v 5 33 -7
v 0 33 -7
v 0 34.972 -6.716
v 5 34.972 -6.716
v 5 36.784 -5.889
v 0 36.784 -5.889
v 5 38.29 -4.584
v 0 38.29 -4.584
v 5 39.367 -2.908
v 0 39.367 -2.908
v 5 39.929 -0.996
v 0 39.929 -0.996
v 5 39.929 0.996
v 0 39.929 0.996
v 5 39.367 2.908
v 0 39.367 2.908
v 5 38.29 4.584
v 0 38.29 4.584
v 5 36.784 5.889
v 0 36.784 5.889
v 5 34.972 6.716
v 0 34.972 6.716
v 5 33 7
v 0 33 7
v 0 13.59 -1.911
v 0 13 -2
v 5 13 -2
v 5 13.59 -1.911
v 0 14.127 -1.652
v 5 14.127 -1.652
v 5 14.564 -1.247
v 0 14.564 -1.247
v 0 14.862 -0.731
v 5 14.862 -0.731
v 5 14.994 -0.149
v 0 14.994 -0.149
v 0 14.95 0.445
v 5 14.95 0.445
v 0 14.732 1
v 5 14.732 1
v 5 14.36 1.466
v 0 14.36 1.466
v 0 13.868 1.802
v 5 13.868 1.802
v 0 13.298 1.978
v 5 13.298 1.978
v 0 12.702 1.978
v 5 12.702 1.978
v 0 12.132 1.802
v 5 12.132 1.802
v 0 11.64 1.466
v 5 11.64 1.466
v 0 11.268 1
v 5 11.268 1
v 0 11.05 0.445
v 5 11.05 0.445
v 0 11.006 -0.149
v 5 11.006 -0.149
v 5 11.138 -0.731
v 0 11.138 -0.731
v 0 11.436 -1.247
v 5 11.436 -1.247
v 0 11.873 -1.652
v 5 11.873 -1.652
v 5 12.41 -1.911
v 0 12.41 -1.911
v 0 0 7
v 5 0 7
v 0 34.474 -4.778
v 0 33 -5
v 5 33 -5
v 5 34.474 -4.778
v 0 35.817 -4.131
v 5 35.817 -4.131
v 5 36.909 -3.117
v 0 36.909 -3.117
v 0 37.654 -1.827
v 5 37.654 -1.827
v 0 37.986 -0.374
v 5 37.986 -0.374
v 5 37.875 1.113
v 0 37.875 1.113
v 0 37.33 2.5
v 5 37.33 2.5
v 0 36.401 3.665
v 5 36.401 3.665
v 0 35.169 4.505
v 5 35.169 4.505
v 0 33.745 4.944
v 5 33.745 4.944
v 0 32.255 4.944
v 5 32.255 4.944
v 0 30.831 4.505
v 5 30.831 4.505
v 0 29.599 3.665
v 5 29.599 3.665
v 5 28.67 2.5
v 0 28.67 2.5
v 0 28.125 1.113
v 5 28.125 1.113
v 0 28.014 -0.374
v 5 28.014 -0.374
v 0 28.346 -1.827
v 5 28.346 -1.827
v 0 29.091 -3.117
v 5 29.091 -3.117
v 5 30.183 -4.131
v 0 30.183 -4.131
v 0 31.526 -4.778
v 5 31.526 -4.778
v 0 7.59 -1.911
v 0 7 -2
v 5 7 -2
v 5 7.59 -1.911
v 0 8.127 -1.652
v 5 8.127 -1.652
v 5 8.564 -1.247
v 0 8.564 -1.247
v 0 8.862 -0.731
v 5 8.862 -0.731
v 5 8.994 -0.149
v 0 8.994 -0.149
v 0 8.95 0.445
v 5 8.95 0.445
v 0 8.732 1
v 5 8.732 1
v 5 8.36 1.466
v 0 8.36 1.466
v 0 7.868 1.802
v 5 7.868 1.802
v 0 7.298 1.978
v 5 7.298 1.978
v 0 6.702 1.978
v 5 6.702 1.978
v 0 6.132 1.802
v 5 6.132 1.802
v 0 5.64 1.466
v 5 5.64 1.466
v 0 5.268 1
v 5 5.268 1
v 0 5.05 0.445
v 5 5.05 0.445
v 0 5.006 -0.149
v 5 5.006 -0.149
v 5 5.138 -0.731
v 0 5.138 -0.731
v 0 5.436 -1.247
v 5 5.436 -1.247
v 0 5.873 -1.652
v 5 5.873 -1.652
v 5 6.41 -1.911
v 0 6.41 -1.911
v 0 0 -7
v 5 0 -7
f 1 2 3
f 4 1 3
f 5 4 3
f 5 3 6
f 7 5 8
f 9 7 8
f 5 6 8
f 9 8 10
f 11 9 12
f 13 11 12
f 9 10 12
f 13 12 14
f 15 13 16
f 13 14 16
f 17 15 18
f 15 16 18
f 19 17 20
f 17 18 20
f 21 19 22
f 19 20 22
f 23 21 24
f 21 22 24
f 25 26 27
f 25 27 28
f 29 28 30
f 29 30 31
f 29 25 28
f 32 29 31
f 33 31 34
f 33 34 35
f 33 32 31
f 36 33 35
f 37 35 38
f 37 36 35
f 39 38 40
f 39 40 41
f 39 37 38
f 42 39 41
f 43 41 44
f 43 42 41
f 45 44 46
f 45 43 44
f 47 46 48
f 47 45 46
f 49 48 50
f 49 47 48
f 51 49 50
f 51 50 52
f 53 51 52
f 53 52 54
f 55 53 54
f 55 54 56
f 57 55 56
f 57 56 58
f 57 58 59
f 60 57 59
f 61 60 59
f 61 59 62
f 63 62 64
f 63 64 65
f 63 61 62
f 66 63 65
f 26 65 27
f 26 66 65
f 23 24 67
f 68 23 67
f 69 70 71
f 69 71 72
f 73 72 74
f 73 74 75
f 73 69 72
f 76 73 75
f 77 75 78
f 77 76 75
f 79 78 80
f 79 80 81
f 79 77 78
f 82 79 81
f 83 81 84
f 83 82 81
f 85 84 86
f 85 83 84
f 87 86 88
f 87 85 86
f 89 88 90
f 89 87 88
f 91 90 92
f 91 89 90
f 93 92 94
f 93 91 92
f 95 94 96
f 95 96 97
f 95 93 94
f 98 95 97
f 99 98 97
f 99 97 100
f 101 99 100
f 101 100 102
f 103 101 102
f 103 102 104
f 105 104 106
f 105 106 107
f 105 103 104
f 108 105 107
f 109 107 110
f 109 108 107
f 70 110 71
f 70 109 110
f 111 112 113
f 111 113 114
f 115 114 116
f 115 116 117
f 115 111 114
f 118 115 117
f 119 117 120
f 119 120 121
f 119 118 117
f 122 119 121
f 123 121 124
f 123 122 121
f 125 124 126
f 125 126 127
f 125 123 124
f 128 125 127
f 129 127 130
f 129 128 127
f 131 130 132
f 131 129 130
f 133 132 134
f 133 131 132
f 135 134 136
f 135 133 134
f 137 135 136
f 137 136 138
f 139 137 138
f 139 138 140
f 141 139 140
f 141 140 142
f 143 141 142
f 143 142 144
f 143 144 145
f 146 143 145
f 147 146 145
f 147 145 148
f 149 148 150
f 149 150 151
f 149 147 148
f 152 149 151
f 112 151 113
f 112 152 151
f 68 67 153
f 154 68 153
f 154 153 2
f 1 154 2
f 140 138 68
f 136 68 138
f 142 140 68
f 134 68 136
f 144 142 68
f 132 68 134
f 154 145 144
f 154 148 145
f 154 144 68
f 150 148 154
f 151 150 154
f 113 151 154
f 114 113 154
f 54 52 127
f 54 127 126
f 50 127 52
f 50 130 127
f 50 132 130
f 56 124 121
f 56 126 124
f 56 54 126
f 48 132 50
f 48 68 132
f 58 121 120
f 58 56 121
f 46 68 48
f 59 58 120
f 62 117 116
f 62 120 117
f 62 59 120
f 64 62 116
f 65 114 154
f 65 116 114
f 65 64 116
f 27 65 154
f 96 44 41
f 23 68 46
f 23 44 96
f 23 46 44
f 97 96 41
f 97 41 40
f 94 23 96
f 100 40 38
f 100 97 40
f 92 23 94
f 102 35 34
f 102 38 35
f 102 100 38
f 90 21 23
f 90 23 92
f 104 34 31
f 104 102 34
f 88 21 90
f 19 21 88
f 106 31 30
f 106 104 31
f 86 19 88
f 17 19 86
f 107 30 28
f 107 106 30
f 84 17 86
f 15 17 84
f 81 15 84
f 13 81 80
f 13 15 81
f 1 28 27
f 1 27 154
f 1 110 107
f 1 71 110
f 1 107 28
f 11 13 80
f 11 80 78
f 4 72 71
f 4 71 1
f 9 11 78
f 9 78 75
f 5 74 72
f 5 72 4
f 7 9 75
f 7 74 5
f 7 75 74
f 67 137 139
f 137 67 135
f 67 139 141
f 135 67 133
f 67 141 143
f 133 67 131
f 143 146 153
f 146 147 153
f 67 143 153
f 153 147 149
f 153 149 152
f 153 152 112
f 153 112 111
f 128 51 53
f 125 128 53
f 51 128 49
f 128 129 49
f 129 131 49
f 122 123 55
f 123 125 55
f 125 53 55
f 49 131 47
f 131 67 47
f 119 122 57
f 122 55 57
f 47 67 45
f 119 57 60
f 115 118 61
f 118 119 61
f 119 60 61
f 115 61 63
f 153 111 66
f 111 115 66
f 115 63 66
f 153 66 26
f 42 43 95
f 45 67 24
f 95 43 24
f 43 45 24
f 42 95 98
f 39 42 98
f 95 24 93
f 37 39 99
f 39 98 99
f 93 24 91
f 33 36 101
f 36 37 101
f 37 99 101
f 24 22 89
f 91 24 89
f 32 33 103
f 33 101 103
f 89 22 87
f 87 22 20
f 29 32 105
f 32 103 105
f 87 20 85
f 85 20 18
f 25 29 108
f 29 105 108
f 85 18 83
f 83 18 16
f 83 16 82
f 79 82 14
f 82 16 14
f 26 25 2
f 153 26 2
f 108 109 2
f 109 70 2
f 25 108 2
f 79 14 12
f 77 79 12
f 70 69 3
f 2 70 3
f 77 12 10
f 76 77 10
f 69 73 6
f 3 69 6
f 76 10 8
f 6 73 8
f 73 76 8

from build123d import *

# Parameters (mm, degrees)
SKETCH_1_R      = 5
SKETCH_1_R_2    = 2
EXTRUDE_1_DEPTH = 5


with BuildPart() as part:
    # 草图1 → 凸台-拉伸1 (new body)
    with BuildSketch(Plane(origin=(0, 0, 0), x_dir=(0, 0, -1), z_dir=(1, 0, 0))):
        with BuildLine():
            Line((-7, 33), (-7, 0))
            Line((-7, 0), (7, 0))
            Line((7, 0), (7, 33))
            ThreePointArc((7, 33), (0, 40), (-7, 33))
        make_face()
        with Locations((0, 33)):
            Circle(SKETCH_1_R, mode=Mode.SUBTRACT)
        with Locations((0, 13)):
            Circle(SKETCH_1_R_2, mode=Mode.SUBTRACT)
        with Locations((0, 7)):
            Circle(SKETCH_1_R_2, mode=Mode.SUBTRACT)
    extrude(amount=EXTRUDE_1_DEPTH)


solid = part.part
